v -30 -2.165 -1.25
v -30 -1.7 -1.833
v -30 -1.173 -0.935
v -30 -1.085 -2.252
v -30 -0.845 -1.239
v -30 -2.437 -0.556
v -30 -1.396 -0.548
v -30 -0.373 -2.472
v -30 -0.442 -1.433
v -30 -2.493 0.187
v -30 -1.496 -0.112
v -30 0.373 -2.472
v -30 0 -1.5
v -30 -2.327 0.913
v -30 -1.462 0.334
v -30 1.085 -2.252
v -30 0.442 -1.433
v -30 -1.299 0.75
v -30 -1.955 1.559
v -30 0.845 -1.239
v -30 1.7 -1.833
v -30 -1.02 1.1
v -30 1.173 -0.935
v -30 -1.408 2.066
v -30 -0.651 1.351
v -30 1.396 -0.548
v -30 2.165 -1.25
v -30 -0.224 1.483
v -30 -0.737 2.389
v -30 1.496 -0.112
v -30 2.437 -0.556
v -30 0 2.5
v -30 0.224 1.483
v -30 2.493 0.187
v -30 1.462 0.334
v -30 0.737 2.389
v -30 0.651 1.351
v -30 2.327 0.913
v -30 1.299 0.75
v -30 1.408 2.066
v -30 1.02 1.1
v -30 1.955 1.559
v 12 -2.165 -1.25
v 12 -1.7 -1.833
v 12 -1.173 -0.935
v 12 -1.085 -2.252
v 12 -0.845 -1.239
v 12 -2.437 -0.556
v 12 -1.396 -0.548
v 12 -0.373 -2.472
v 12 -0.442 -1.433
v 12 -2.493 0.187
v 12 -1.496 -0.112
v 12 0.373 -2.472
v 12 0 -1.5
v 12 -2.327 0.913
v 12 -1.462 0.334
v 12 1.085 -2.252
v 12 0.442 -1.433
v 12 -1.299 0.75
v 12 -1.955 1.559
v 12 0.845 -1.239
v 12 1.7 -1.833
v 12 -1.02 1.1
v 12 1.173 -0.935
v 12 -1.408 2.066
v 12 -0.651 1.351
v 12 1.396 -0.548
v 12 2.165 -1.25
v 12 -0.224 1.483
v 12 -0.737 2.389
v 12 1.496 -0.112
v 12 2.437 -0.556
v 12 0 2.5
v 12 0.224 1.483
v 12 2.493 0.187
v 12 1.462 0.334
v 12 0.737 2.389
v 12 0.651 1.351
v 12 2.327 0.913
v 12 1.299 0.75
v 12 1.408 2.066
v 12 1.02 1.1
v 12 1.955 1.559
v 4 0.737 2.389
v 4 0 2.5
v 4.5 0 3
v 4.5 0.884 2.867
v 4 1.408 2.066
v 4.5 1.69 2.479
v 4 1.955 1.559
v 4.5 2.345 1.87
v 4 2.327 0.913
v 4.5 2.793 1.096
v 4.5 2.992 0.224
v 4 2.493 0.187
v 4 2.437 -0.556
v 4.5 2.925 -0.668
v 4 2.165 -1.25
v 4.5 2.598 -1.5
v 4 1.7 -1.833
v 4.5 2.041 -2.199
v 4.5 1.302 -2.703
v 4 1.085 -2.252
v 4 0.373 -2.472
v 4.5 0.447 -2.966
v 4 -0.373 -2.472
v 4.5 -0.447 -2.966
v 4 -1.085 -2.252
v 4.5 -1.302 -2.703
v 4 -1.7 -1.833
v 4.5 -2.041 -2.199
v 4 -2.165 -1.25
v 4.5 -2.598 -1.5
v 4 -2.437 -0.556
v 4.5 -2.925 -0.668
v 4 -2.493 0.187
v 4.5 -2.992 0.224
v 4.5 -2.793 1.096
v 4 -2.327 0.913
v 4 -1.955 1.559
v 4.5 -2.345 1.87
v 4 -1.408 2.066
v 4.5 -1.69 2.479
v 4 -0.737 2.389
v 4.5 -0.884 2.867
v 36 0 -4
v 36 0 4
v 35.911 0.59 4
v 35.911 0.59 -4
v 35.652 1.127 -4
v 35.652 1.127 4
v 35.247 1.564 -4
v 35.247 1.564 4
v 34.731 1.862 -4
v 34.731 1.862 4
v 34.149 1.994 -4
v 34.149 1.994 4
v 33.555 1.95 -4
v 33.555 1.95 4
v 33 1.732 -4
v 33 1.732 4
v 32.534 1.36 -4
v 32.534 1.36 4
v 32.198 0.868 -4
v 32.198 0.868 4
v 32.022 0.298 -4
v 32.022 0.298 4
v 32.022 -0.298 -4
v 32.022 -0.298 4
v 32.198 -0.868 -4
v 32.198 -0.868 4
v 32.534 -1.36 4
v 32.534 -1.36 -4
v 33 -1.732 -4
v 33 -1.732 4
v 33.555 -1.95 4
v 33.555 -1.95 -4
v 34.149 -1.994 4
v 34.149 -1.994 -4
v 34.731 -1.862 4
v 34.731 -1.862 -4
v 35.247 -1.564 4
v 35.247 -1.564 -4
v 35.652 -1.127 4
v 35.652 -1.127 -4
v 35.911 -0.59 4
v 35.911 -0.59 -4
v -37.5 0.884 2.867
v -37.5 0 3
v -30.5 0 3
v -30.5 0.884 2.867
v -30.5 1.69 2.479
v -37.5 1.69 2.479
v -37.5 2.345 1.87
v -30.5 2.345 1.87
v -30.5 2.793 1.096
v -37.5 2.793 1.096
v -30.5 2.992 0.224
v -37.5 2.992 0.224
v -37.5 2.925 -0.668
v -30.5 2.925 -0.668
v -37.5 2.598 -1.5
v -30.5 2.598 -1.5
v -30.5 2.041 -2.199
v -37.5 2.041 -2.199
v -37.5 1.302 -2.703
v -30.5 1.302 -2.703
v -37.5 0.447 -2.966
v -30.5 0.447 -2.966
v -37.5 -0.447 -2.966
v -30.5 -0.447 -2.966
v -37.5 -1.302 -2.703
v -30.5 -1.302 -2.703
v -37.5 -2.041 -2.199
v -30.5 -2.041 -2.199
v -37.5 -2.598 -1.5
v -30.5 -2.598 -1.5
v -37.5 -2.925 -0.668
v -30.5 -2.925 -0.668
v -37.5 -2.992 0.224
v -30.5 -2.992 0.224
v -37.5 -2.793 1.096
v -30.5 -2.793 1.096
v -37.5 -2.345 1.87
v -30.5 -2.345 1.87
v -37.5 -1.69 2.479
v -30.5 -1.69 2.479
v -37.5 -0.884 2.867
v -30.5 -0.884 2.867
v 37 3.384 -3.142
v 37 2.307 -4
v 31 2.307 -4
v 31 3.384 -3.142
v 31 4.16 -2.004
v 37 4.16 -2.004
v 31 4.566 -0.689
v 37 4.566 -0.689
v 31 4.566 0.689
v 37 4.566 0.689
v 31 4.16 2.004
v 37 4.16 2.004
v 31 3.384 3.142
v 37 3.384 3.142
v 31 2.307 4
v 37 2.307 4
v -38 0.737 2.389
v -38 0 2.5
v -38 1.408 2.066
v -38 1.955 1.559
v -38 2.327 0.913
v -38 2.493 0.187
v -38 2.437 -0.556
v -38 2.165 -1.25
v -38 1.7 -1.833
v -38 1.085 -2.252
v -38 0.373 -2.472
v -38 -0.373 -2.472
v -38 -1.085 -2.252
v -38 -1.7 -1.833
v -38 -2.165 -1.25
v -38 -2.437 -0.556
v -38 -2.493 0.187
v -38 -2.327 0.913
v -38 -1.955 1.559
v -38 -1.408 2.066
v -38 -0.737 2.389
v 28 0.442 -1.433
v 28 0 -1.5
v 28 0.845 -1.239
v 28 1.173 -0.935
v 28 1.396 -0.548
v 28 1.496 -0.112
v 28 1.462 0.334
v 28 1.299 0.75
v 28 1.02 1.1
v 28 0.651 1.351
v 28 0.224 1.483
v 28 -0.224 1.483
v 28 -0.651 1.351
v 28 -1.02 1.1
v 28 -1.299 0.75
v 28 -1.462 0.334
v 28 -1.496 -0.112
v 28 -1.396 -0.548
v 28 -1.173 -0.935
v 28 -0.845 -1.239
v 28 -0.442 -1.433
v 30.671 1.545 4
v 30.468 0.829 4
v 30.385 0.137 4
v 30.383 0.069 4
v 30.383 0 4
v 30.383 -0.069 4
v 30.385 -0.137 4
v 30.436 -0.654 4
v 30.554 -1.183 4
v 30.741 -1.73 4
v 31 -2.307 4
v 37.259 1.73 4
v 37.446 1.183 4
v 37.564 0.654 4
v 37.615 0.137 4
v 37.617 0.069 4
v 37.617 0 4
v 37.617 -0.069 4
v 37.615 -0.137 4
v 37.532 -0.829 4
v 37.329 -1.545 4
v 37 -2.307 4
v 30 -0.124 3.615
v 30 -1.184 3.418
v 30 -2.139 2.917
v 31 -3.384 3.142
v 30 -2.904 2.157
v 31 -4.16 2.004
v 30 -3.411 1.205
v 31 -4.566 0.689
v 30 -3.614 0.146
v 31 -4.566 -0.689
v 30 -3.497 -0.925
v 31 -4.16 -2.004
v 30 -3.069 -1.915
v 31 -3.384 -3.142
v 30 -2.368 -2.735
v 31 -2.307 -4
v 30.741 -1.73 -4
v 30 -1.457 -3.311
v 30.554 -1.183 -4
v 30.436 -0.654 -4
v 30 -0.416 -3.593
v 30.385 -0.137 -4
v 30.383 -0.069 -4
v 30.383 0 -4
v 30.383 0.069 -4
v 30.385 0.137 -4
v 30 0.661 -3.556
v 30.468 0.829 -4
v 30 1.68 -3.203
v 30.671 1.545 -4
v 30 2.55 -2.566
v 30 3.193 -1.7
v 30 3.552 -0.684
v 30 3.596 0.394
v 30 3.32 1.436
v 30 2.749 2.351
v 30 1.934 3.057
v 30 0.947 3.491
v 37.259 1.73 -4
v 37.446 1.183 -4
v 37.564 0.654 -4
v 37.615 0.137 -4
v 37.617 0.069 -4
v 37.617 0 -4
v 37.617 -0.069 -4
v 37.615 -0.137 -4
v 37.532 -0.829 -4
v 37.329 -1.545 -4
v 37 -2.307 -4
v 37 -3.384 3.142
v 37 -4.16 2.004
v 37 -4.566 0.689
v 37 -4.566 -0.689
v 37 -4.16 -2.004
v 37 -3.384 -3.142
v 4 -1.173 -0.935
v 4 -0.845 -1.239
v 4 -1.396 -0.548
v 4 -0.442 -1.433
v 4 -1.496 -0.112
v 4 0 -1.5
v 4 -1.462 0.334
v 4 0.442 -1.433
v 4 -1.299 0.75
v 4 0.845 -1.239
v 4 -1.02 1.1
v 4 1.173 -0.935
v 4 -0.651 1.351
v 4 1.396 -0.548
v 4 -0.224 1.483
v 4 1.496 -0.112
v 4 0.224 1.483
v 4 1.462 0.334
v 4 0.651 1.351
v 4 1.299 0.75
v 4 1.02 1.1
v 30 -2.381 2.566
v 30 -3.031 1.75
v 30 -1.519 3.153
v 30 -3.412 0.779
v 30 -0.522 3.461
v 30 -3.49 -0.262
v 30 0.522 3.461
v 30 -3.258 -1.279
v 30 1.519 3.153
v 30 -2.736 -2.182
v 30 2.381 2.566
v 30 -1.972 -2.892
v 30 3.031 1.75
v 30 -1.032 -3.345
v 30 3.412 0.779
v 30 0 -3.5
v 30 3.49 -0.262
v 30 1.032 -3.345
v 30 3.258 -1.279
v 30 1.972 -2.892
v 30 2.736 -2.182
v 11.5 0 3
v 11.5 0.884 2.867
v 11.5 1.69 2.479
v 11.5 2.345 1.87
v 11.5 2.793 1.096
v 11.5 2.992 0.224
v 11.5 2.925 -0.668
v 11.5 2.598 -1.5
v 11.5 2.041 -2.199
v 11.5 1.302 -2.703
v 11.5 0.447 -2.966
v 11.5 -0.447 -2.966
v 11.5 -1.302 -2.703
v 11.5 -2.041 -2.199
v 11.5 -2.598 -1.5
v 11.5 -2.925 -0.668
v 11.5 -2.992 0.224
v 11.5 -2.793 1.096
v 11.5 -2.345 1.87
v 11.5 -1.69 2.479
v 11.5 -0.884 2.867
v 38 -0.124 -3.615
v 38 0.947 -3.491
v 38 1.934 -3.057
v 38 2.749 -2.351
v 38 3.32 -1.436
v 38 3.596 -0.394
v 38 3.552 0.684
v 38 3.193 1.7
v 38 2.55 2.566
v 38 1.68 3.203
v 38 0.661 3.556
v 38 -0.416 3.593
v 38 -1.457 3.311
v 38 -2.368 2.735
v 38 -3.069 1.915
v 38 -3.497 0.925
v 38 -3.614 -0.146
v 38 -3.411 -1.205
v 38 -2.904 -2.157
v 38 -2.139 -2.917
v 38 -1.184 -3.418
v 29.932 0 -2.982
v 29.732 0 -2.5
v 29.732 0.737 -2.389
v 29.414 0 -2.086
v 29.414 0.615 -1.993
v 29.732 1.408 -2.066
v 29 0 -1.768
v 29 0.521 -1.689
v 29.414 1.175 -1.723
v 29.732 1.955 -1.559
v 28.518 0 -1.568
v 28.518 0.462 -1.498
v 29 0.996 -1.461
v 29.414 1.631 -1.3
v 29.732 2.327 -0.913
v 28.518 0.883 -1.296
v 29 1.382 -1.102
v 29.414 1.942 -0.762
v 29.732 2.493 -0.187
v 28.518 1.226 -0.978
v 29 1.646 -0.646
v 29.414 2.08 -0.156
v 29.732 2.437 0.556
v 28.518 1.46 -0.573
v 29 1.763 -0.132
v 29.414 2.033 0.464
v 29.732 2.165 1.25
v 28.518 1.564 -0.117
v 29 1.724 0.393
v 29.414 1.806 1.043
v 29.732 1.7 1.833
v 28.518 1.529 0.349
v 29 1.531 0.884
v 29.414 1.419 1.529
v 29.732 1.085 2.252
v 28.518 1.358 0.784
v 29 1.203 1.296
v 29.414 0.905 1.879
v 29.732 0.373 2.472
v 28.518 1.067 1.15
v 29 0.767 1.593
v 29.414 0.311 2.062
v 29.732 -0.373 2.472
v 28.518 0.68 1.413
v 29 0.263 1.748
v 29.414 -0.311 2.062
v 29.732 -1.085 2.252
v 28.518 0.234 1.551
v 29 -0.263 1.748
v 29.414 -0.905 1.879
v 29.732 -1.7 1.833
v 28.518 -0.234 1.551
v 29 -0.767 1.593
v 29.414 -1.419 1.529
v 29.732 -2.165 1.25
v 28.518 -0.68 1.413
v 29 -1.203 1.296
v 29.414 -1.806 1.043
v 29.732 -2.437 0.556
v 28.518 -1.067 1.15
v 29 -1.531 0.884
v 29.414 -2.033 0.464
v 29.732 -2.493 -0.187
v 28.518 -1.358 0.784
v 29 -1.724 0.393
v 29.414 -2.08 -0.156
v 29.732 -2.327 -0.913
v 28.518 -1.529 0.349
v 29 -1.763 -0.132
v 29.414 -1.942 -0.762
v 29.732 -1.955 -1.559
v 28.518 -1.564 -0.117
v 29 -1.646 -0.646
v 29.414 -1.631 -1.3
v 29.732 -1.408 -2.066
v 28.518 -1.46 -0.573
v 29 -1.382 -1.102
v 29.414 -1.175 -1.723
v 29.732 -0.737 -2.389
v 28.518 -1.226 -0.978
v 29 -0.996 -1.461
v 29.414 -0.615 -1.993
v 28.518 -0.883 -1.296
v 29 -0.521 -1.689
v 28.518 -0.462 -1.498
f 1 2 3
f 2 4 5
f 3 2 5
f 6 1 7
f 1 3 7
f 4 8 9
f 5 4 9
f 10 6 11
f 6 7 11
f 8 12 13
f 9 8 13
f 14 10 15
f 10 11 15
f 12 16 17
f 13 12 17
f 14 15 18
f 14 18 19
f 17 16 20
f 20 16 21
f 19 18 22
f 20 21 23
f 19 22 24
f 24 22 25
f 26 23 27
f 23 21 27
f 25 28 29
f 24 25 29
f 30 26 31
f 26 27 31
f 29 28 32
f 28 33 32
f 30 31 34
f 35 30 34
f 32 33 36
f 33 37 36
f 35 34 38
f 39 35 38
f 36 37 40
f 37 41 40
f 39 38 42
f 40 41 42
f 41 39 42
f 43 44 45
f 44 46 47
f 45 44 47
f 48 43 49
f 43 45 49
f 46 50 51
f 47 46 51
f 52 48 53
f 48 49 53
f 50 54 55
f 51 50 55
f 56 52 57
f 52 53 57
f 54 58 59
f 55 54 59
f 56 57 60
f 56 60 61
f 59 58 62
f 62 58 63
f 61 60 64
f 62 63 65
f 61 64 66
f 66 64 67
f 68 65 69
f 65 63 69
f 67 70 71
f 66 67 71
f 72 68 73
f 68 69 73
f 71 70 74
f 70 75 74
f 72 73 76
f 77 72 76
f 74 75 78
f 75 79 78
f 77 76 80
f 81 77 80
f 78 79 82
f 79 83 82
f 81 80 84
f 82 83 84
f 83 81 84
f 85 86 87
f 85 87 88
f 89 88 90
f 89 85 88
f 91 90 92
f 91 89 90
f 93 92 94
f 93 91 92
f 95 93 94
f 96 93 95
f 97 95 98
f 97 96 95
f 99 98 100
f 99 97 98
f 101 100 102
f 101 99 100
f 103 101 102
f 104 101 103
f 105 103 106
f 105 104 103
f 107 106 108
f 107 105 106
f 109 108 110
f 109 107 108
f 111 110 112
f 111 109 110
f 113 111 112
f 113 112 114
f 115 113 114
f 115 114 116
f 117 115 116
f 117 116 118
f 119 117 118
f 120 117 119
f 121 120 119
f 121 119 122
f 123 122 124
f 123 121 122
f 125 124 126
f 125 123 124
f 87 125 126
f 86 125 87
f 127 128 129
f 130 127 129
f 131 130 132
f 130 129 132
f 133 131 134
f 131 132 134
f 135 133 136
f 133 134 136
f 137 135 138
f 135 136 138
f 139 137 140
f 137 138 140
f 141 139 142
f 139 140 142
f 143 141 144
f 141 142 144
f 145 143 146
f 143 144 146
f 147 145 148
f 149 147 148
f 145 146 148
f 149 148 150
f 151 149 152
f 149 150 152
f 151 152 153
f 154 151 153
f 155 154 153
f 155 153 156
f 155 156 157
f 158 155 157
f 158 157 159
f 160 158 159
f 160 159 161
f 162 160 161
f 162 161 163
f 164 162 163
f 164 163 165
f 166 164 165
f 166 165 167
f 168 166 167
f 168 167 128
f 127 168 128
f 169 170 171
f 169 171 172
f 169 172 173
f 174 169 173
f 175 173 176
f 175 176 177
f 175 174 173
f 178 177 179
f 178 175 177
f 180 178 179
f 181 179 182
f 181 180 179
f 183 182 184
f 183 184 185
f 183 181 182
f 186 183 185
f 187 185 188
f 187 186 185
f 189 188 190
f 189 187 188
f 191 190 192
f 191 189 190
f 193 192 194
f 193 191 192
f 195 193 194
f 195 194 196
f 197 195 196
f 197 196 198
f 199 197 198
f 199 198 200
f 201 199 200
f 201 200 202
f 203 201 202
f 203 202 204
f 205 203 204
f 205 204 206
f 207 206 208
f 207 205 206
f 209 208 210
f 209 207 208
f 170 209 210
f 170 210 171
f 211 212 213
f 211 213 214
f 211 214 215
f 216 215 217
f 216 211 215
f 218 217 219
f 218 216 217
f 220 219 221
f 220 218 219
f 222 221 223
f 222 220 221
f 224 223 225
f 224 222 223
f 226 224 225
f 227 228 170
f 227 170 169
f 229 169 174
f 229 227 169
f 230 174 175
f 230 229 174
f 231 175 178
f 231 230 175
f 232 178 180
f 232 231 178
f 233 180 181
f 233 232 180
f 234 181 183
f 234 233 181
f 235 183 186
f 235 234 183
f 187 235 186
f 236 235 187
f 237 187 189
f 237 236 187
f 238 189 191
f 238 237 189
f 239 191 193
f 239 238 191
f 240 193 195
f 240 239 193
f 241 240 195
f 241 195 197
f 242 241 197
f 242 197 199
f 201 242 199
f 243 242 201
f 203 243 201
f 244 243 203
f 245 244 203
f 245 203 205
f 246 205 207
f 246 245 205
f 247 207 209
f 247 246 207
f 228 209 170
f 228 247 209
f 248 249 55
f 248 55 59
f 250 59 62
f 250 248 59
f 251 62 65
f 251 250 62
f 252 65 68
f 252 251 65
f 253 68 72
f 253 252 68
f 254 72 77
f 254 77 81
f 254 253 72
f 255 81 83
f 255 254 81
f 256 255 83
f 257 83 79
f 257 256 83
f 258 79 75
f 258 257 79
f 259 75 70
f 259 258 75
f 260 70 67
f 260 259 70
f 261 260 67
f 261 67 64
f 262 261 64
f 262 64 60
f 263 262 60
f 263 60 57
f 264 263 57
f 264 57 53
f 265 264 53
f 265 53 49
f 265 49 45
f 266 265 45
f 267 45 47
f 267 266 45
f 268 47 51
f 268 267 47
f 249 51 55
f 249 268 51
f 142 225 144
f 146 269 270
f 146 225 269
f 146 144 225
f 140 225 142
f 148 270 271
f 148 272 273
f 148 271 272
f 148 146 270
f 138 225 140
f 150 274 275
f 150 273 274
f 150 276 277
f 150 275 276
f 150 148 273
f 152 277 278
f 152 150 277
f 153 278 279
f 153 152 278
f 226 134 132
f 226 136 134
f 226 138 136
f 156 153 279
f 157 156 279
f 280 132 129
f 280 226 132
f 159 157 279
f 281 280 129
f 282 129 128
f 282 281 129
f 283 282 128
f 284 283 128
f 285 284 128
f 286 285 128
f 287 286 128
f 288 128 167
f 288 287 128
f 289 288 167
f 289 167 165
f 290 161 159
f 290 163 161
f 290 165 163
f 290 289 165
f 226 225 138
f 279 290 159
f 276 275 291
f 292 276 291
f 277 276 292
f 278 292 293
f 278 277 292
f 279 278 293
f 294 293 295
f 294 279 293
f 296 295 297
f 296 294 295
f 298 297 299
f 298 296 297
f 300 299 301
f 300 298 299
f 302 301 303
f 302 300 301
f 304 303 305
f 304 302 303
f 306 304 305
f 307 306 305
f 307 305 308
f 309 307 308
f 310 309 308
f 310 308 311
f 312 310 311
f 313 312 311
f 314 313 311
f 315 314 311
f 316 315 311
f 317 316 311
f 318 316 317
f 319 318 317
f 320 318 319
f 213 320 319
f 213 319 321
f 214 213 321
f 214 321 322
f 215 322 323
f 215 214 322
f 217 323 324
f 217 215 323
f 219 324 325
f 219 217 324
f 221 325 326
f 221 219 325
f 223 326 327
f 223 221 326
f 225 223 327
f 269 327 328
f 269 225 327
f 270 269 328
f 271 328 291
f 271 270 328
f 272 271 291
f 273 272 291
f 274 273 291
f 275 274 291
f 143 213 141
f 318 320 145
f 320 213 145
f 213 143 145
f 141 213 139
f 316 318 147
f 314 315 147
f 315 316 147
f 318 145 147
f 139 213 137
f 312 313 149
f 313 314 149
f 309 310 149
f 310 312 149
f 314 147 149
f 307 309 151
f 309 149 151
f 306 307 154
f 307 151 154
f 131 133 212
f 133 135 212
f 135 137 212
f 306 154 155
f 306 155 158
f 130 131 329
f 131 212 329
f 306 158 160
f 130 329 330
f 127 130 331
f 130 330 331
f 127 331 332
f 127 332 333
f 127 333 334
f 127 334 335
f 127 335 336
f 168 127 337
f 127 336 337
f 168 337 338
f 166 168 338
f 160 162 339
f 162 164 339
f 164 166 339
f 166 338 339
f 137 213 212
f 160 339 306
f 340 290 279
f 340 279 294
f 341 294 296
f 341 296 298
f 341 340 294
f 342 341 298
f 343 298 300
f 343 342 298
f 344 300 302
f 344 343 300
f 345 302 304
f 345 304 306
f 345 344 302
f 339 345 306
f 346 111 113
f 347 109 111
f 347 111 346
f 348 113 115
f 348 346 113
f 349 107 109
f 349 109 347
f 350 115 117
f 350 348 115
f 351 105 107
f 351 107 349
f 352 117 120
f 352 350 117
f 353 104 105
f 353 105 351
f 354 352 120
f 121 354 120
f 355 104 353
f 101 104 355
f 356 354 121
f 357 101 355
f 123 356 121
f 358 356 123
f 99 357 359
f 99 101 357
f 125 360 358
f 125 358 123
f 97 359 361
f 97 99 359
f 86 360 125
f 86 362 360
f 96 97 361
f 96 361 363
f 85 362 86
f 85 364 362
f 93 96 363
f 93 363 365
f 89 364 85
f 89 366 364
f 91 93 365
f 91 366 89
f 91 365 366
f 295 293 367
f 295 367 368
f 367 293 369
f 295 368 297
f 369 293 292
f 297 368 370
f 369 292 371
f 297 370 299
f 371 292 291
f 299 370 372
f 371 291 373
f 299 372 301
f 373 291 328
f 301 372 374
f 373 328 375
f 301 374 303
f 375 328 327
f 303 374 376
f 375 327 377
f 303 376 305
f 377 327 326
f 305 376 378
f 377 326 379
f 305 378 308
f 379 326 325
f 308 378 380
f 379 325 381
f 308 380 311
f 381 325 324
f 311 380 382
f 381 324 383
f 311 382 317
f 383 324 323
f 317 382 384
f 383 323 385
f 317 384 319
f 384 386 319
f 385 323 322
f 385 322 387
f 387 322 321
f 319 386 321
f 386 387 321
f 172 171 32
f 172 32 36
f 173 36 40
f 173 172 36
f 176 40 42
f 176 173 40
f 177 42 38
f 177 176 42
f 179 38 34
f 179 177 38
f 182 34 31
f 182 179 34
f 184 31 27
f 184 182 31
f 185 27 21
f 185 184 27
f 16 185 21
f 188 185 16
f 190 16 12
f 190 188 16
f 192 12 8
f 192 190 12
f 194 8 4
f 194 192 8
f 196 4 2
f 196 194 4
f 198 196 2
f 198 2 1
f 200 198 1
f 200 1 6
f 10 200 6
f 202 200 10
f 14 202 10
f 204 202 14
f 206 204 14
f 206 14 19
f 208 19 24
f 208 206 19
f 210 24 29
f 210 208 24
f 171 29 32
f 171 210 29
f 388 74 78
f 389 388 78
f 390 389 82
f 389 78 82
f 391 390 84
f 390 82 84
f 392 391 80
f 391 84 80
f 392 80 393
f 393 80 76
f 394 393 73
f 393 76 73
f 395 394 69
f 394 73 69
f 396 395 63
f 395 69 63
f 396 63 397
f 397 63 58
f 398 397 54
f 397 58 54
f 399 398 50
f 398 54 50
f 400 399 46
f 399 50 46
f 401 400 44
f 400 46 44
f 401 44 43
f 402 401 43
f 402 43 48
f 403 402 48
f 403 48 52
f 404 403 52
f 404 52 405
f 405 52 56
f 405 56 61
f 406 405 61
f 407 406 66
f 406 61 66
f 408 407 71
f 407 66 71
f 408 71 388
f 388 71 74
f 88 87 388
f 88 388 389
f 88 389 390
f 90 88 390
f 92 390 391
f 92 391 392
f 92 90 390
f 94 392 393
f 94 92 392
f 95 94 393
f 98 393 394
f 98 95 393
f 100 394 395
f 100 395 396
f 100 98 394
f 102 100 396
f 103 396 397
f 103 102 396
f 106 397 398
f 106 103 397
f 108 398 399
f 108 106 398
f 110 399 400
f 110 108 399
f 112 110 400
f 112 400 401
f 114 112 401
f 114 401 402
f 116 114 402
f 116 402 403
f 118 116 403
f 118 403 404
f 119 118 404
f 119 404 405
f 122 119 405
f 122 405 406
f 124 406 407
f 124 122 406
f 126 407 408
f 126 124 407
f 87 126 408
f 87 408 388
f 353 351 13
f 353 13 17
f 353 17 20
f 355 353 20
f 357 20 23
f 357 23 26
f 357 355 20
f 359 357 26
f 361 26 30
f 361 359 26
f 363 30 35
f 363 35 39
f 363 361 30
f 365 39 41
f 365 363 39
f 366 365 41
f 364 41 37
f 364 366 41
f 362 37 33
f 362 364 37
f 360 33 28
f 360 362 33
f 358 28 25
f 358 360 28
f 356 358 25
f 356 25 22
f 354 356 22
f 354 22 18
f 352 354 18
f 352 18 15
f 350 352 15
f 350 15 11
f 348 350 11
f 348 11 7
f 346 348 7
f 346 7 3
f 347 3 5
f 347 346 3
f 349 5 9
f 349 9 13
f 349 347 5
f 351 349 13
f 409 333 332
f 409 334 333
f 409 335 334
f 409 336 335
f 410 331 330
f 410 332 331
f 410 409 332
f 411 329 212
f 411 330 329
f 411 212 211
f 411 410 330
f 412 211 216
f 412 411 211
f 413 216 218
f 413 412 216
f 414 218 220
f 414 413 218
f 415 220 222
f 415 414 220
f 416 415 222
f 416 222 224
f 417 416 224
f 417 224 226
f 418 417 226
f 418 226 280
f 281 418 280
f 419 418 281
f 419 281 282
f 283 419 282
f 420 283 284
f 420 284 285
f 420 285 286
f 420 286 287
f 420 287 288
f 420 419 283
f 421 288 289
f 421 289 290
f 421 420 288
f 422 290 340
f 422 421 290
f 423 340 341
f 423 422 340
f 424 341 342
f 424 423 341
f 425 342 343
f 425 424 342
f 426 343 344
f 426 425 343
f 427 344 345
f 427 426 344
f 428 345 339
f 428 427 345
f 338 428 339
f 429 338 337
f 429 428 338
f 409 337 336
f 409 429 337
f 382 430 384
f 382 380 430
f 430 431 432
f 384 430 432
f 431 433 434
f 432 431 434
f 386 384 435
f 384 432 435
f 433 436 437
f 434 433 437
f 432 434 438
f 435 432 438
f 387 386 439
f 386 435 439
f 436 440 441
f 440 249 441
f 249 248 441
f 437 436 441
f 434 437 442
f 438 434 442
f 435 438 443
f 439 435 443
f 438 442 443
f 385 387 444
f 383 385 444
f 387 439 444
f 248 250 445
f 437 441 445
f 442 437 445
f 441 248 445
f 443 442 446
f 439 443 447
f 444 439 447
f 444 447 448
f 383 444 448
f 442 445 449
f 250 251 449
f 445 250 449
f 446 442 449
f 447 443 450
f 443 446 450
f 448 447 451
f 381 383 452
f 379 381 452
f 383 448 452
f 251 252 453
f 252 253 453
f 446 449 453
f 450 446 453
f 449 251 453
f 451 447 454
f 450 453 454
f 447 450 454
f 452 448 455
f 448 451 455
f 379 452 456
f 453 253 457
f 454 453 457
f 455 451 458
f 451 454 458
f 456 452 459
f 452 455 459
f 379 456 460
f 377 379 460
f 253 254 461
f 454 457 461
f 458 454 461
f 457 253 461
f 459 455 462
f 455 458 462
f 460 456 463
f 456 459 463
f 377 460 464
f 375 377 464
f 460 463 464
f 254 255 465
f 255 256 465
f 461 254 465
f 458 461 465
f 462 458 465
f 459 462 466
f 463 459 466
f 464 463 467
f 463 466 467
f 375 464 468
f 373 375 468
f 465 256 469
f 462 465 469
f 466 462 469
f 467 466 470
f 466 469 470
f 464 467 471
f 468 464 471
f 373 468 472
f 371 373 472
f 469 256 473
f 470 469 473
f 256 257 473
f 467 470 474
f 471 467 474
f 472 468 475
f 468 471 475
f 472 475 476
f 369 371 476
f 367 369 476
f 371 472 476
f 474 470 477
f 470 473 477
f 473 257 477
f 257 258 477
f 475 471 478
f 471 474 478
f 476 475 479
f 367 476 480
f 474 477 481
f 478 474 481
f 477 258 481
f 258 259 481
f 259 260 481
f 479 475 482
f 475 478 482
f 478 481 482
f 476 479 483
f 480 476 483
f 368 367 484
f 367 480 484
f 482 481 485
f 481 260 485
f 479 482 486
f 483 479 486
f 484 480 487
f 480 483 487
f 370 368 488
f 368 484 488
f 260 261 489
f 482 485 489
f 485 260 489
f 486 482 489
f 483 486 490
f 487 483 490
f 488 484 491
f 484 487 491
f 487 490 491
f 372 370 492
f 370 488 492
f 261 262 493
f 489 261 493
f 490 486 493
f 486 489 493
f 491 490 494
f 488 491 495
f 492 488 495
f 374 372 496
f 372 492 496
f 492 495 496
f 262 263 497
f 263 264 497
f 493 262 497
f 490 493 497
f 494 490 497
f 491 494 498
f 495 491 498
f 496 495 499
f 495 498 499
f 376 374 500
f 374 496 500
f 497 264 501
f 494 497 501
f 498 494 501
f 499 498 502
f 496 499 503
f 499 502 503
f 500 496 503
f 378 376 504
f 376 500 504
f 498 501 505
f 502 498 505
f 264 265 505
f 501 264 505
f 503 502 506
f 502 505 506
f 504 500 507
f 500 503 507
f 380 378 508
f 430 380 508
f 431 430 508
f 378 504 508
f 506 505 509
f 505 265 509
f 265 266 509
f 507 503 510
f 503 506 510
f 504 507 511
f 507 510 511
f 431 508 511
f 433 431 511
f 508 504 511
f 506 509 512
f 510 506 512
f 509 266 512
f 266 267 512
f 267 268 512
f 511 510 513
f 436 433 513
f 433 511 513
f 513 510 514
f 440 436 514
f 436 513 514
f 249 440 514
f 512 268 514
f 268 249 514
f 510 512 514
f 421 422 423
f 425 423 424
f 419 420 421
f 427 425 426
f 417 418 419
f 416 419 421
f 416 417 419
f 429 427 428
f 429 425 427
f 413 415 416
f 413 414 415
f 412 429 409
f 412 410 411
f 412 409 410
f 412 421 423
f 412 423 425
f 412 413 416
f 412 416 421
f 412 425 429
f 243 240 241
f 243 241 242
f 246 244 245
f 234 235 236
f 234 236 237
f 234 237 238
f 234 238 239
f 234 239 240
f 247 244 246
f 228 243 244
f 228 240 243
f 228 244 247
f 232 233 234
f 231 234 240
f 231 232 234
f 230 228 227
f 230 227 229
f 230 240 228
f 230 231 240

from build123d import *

# Parameters (mm, degrees)
SKETCH1_R           = 1.5
BOSS_EXTRUDE1_DEPTH = 38
SKETCH2_R           = 3
BOSS_EXTRUDE2_DEPTH = 8
BOSS_EXTRUDE3_START = -42
SKETCH2_2_R         = 3
BOSS_EXTRUDE3_DEPTH = 8
CHAMFER1_SIZE       = 0.5
SKETCH3_R           = 4.617370453
BOSS_EXTRUDE4_DEPTH = 8
CUT_EXTRUDE1_DEPTH  = 8
SKETCH5_R           = 2
CUT_EXTRUDE2_DEPTH  = 40.1065226
CHAMFER2_SIZE       = 1
FILLET1_R           = 2


with BuildPart() as part:
    # Sketch1 → Boss-Extrude1 (new, symmetric)
    with BuildSketch(Plane(origin=(0, 0, 0), x_dir=(0, 0, -1), z_dir=(1, 0, 0))):
        Circle(SKETCH1_R)
    extrude(amount=BOSS_EXTRUDE1_DEPTH, both=True)

    # Sketch2 → Boss-Extrude2 (add)
    with BuildSketch(Plane.ZY.offset(38)):
        Circle(SKETCH2_R)
    extrude(amount=-BOSS_EXTRUDE2_DEPTH)

    # Sketch2<2> → Boss-Extrude3 (add)
    with BuildSketch(Plane.ZY.offset(38).offset(BOSS_EXTRUDE3_START)):
        Circle(SKETCH2_2_R)
    extrude(amount=-BOSS_EXTRUDE3_DEPTH)

    # Chamfer1
    chamfer1_edges = [part.edges().sort_by_distance(p)[0] for p in [
        (12, 0, -3),
        (4, 0, -3),
        (-30, 0, -3),
        (-38, 0, -3),
    ]]
    chamfer(chamfer1_edges, length=CHAMFER1_SIZE)

    # Sketch3 → Boss-Extrude4 (add)
    with BuildSketch(Plane(origin=(38, 0, 0), x_dir=(0, 0, -1), z_dir=(1, 0, 0))):
        Circle(SKETCH3_R)
    extrude(amount=-BOSS_EXTRUDE4_DEPTH)

    # Sketch4 → Cut-Extrude1 (cut)
    with BuildSketch(Plane(origin=(38, 0, 0), x_dir=(0, 0, -1), z_dir=(1, 0, 0))):
        with BuildLine():
            Line((-4, 2.306536342), (-4, -2.306536342))
            ThreePointArc((-4, -2.306536342), (-4.617370453, 0), (-4, 2.306536342))
        make_face()
        with BuildLine():
            Line((4, 2.306536342), (4, -2.306536342))
            ThreePointArc((4, -2.306536342), (4.617370453, 0), (4, 2.306536342))
        make_face()
    extrude(amount=-CUT_EXTRUDE1_DEPTH, mode=Mode.SUBTRACT)

    # Sketch5 → Cut-Extrude2 (cut, through all)
    with BuildSketch(Plane.XY.offset(4)):
        with Locations((34, 0)):
            Circle(SKETCH5_R)
    extrude(amount=-CUT_EXTRUDE2_DEPTH, mode=Mode.SUBTRACT)

    # Chamfer2
    # the kernel refuses this chamfer: 1 mm, written as the material it takes off along each edge
    with BuildSketch(Plane(origin=(30, 0, 0), x_dir=(0, -0.03428839370133285, -0.9994119801450163), z_dir=(0, -0.9994119801450163, 0.03428839370133285))) as chamfer2_piece_1:
        Polygon((4.617370453 - CHAMFER2_SIZE, 0), (4.617370453, CHAMFER2_SIZE), (4.617370453, 0), align=None)
    revolve(axis=Axis((30, 0, 0), (1, 0, 0)), revolution_arc=183.929930813, mode=Mode.SUBTRACT)
    with BuildSketch(Plane(origin=(38, 0, 0), x_dir=(0, -0.0342883937013343, -0.9994119801450161), z_dir=(0, -0.9994119801450161, 0.0342883937013343))) as chamfer2_piece_2:
        Polygon((4.617370453, -CHAMFER2_SIZE), (4.617370453 - CHAMFER2_SIZE, 0), (4.617370453, 0), align=None)
    revolve(axis=Axis((38, 0, 0), (1, 0, 0)), revolution_arc=183.929930813, mode=Mode.SUBTRACT)
    with BuildSketch(Plane(origin=(38, 0, 0), x_dir=(0, 0.03428839370133442, 0.9994119801450161), z_dir=(0, 0.9994119801450161, -0.03428839370133442))) as chamfer2_piece_3:
        Polygon((4.617370453, -CHAMFER2_SIZE), (4.617370453 - CHAMFER2_SIZE, 0), (4.617370453, 0), align=None)
    revolve(axis=Axis((38, 0, 0), (1, 0, 0)), revolution_arc=183.929930813, mode=Mode.SUBTRACT)
    with BuildSketch(Plane(origin=(30, 0, 0), x_dir=(0, 0.034288393701332645, 0.9994119801450163), z_dir=(0, 0.9994119801450163, -0.034288393701332645))) as chamfer2_piece_4:
        Polygon((4.617370453 - CHAMFER2_SIZE, 0), (4.617370453, CHAMFER2_SIZE), (4.617370453, 0), align=None)
    revolve(axis=Axis((30, 0, 0), (1, 0, 0)), revolution_arc=183.929930813, mode=Mode.SUBTRACT)

    # Fillet1
    fillet1_edges = [part.edges().sort_by_distance(p)[0] for p in [
        (30, 0, 1.5),
    ]]
    fillet(fillet1_edges, radius=FILLET1_R)


solid = part.part
